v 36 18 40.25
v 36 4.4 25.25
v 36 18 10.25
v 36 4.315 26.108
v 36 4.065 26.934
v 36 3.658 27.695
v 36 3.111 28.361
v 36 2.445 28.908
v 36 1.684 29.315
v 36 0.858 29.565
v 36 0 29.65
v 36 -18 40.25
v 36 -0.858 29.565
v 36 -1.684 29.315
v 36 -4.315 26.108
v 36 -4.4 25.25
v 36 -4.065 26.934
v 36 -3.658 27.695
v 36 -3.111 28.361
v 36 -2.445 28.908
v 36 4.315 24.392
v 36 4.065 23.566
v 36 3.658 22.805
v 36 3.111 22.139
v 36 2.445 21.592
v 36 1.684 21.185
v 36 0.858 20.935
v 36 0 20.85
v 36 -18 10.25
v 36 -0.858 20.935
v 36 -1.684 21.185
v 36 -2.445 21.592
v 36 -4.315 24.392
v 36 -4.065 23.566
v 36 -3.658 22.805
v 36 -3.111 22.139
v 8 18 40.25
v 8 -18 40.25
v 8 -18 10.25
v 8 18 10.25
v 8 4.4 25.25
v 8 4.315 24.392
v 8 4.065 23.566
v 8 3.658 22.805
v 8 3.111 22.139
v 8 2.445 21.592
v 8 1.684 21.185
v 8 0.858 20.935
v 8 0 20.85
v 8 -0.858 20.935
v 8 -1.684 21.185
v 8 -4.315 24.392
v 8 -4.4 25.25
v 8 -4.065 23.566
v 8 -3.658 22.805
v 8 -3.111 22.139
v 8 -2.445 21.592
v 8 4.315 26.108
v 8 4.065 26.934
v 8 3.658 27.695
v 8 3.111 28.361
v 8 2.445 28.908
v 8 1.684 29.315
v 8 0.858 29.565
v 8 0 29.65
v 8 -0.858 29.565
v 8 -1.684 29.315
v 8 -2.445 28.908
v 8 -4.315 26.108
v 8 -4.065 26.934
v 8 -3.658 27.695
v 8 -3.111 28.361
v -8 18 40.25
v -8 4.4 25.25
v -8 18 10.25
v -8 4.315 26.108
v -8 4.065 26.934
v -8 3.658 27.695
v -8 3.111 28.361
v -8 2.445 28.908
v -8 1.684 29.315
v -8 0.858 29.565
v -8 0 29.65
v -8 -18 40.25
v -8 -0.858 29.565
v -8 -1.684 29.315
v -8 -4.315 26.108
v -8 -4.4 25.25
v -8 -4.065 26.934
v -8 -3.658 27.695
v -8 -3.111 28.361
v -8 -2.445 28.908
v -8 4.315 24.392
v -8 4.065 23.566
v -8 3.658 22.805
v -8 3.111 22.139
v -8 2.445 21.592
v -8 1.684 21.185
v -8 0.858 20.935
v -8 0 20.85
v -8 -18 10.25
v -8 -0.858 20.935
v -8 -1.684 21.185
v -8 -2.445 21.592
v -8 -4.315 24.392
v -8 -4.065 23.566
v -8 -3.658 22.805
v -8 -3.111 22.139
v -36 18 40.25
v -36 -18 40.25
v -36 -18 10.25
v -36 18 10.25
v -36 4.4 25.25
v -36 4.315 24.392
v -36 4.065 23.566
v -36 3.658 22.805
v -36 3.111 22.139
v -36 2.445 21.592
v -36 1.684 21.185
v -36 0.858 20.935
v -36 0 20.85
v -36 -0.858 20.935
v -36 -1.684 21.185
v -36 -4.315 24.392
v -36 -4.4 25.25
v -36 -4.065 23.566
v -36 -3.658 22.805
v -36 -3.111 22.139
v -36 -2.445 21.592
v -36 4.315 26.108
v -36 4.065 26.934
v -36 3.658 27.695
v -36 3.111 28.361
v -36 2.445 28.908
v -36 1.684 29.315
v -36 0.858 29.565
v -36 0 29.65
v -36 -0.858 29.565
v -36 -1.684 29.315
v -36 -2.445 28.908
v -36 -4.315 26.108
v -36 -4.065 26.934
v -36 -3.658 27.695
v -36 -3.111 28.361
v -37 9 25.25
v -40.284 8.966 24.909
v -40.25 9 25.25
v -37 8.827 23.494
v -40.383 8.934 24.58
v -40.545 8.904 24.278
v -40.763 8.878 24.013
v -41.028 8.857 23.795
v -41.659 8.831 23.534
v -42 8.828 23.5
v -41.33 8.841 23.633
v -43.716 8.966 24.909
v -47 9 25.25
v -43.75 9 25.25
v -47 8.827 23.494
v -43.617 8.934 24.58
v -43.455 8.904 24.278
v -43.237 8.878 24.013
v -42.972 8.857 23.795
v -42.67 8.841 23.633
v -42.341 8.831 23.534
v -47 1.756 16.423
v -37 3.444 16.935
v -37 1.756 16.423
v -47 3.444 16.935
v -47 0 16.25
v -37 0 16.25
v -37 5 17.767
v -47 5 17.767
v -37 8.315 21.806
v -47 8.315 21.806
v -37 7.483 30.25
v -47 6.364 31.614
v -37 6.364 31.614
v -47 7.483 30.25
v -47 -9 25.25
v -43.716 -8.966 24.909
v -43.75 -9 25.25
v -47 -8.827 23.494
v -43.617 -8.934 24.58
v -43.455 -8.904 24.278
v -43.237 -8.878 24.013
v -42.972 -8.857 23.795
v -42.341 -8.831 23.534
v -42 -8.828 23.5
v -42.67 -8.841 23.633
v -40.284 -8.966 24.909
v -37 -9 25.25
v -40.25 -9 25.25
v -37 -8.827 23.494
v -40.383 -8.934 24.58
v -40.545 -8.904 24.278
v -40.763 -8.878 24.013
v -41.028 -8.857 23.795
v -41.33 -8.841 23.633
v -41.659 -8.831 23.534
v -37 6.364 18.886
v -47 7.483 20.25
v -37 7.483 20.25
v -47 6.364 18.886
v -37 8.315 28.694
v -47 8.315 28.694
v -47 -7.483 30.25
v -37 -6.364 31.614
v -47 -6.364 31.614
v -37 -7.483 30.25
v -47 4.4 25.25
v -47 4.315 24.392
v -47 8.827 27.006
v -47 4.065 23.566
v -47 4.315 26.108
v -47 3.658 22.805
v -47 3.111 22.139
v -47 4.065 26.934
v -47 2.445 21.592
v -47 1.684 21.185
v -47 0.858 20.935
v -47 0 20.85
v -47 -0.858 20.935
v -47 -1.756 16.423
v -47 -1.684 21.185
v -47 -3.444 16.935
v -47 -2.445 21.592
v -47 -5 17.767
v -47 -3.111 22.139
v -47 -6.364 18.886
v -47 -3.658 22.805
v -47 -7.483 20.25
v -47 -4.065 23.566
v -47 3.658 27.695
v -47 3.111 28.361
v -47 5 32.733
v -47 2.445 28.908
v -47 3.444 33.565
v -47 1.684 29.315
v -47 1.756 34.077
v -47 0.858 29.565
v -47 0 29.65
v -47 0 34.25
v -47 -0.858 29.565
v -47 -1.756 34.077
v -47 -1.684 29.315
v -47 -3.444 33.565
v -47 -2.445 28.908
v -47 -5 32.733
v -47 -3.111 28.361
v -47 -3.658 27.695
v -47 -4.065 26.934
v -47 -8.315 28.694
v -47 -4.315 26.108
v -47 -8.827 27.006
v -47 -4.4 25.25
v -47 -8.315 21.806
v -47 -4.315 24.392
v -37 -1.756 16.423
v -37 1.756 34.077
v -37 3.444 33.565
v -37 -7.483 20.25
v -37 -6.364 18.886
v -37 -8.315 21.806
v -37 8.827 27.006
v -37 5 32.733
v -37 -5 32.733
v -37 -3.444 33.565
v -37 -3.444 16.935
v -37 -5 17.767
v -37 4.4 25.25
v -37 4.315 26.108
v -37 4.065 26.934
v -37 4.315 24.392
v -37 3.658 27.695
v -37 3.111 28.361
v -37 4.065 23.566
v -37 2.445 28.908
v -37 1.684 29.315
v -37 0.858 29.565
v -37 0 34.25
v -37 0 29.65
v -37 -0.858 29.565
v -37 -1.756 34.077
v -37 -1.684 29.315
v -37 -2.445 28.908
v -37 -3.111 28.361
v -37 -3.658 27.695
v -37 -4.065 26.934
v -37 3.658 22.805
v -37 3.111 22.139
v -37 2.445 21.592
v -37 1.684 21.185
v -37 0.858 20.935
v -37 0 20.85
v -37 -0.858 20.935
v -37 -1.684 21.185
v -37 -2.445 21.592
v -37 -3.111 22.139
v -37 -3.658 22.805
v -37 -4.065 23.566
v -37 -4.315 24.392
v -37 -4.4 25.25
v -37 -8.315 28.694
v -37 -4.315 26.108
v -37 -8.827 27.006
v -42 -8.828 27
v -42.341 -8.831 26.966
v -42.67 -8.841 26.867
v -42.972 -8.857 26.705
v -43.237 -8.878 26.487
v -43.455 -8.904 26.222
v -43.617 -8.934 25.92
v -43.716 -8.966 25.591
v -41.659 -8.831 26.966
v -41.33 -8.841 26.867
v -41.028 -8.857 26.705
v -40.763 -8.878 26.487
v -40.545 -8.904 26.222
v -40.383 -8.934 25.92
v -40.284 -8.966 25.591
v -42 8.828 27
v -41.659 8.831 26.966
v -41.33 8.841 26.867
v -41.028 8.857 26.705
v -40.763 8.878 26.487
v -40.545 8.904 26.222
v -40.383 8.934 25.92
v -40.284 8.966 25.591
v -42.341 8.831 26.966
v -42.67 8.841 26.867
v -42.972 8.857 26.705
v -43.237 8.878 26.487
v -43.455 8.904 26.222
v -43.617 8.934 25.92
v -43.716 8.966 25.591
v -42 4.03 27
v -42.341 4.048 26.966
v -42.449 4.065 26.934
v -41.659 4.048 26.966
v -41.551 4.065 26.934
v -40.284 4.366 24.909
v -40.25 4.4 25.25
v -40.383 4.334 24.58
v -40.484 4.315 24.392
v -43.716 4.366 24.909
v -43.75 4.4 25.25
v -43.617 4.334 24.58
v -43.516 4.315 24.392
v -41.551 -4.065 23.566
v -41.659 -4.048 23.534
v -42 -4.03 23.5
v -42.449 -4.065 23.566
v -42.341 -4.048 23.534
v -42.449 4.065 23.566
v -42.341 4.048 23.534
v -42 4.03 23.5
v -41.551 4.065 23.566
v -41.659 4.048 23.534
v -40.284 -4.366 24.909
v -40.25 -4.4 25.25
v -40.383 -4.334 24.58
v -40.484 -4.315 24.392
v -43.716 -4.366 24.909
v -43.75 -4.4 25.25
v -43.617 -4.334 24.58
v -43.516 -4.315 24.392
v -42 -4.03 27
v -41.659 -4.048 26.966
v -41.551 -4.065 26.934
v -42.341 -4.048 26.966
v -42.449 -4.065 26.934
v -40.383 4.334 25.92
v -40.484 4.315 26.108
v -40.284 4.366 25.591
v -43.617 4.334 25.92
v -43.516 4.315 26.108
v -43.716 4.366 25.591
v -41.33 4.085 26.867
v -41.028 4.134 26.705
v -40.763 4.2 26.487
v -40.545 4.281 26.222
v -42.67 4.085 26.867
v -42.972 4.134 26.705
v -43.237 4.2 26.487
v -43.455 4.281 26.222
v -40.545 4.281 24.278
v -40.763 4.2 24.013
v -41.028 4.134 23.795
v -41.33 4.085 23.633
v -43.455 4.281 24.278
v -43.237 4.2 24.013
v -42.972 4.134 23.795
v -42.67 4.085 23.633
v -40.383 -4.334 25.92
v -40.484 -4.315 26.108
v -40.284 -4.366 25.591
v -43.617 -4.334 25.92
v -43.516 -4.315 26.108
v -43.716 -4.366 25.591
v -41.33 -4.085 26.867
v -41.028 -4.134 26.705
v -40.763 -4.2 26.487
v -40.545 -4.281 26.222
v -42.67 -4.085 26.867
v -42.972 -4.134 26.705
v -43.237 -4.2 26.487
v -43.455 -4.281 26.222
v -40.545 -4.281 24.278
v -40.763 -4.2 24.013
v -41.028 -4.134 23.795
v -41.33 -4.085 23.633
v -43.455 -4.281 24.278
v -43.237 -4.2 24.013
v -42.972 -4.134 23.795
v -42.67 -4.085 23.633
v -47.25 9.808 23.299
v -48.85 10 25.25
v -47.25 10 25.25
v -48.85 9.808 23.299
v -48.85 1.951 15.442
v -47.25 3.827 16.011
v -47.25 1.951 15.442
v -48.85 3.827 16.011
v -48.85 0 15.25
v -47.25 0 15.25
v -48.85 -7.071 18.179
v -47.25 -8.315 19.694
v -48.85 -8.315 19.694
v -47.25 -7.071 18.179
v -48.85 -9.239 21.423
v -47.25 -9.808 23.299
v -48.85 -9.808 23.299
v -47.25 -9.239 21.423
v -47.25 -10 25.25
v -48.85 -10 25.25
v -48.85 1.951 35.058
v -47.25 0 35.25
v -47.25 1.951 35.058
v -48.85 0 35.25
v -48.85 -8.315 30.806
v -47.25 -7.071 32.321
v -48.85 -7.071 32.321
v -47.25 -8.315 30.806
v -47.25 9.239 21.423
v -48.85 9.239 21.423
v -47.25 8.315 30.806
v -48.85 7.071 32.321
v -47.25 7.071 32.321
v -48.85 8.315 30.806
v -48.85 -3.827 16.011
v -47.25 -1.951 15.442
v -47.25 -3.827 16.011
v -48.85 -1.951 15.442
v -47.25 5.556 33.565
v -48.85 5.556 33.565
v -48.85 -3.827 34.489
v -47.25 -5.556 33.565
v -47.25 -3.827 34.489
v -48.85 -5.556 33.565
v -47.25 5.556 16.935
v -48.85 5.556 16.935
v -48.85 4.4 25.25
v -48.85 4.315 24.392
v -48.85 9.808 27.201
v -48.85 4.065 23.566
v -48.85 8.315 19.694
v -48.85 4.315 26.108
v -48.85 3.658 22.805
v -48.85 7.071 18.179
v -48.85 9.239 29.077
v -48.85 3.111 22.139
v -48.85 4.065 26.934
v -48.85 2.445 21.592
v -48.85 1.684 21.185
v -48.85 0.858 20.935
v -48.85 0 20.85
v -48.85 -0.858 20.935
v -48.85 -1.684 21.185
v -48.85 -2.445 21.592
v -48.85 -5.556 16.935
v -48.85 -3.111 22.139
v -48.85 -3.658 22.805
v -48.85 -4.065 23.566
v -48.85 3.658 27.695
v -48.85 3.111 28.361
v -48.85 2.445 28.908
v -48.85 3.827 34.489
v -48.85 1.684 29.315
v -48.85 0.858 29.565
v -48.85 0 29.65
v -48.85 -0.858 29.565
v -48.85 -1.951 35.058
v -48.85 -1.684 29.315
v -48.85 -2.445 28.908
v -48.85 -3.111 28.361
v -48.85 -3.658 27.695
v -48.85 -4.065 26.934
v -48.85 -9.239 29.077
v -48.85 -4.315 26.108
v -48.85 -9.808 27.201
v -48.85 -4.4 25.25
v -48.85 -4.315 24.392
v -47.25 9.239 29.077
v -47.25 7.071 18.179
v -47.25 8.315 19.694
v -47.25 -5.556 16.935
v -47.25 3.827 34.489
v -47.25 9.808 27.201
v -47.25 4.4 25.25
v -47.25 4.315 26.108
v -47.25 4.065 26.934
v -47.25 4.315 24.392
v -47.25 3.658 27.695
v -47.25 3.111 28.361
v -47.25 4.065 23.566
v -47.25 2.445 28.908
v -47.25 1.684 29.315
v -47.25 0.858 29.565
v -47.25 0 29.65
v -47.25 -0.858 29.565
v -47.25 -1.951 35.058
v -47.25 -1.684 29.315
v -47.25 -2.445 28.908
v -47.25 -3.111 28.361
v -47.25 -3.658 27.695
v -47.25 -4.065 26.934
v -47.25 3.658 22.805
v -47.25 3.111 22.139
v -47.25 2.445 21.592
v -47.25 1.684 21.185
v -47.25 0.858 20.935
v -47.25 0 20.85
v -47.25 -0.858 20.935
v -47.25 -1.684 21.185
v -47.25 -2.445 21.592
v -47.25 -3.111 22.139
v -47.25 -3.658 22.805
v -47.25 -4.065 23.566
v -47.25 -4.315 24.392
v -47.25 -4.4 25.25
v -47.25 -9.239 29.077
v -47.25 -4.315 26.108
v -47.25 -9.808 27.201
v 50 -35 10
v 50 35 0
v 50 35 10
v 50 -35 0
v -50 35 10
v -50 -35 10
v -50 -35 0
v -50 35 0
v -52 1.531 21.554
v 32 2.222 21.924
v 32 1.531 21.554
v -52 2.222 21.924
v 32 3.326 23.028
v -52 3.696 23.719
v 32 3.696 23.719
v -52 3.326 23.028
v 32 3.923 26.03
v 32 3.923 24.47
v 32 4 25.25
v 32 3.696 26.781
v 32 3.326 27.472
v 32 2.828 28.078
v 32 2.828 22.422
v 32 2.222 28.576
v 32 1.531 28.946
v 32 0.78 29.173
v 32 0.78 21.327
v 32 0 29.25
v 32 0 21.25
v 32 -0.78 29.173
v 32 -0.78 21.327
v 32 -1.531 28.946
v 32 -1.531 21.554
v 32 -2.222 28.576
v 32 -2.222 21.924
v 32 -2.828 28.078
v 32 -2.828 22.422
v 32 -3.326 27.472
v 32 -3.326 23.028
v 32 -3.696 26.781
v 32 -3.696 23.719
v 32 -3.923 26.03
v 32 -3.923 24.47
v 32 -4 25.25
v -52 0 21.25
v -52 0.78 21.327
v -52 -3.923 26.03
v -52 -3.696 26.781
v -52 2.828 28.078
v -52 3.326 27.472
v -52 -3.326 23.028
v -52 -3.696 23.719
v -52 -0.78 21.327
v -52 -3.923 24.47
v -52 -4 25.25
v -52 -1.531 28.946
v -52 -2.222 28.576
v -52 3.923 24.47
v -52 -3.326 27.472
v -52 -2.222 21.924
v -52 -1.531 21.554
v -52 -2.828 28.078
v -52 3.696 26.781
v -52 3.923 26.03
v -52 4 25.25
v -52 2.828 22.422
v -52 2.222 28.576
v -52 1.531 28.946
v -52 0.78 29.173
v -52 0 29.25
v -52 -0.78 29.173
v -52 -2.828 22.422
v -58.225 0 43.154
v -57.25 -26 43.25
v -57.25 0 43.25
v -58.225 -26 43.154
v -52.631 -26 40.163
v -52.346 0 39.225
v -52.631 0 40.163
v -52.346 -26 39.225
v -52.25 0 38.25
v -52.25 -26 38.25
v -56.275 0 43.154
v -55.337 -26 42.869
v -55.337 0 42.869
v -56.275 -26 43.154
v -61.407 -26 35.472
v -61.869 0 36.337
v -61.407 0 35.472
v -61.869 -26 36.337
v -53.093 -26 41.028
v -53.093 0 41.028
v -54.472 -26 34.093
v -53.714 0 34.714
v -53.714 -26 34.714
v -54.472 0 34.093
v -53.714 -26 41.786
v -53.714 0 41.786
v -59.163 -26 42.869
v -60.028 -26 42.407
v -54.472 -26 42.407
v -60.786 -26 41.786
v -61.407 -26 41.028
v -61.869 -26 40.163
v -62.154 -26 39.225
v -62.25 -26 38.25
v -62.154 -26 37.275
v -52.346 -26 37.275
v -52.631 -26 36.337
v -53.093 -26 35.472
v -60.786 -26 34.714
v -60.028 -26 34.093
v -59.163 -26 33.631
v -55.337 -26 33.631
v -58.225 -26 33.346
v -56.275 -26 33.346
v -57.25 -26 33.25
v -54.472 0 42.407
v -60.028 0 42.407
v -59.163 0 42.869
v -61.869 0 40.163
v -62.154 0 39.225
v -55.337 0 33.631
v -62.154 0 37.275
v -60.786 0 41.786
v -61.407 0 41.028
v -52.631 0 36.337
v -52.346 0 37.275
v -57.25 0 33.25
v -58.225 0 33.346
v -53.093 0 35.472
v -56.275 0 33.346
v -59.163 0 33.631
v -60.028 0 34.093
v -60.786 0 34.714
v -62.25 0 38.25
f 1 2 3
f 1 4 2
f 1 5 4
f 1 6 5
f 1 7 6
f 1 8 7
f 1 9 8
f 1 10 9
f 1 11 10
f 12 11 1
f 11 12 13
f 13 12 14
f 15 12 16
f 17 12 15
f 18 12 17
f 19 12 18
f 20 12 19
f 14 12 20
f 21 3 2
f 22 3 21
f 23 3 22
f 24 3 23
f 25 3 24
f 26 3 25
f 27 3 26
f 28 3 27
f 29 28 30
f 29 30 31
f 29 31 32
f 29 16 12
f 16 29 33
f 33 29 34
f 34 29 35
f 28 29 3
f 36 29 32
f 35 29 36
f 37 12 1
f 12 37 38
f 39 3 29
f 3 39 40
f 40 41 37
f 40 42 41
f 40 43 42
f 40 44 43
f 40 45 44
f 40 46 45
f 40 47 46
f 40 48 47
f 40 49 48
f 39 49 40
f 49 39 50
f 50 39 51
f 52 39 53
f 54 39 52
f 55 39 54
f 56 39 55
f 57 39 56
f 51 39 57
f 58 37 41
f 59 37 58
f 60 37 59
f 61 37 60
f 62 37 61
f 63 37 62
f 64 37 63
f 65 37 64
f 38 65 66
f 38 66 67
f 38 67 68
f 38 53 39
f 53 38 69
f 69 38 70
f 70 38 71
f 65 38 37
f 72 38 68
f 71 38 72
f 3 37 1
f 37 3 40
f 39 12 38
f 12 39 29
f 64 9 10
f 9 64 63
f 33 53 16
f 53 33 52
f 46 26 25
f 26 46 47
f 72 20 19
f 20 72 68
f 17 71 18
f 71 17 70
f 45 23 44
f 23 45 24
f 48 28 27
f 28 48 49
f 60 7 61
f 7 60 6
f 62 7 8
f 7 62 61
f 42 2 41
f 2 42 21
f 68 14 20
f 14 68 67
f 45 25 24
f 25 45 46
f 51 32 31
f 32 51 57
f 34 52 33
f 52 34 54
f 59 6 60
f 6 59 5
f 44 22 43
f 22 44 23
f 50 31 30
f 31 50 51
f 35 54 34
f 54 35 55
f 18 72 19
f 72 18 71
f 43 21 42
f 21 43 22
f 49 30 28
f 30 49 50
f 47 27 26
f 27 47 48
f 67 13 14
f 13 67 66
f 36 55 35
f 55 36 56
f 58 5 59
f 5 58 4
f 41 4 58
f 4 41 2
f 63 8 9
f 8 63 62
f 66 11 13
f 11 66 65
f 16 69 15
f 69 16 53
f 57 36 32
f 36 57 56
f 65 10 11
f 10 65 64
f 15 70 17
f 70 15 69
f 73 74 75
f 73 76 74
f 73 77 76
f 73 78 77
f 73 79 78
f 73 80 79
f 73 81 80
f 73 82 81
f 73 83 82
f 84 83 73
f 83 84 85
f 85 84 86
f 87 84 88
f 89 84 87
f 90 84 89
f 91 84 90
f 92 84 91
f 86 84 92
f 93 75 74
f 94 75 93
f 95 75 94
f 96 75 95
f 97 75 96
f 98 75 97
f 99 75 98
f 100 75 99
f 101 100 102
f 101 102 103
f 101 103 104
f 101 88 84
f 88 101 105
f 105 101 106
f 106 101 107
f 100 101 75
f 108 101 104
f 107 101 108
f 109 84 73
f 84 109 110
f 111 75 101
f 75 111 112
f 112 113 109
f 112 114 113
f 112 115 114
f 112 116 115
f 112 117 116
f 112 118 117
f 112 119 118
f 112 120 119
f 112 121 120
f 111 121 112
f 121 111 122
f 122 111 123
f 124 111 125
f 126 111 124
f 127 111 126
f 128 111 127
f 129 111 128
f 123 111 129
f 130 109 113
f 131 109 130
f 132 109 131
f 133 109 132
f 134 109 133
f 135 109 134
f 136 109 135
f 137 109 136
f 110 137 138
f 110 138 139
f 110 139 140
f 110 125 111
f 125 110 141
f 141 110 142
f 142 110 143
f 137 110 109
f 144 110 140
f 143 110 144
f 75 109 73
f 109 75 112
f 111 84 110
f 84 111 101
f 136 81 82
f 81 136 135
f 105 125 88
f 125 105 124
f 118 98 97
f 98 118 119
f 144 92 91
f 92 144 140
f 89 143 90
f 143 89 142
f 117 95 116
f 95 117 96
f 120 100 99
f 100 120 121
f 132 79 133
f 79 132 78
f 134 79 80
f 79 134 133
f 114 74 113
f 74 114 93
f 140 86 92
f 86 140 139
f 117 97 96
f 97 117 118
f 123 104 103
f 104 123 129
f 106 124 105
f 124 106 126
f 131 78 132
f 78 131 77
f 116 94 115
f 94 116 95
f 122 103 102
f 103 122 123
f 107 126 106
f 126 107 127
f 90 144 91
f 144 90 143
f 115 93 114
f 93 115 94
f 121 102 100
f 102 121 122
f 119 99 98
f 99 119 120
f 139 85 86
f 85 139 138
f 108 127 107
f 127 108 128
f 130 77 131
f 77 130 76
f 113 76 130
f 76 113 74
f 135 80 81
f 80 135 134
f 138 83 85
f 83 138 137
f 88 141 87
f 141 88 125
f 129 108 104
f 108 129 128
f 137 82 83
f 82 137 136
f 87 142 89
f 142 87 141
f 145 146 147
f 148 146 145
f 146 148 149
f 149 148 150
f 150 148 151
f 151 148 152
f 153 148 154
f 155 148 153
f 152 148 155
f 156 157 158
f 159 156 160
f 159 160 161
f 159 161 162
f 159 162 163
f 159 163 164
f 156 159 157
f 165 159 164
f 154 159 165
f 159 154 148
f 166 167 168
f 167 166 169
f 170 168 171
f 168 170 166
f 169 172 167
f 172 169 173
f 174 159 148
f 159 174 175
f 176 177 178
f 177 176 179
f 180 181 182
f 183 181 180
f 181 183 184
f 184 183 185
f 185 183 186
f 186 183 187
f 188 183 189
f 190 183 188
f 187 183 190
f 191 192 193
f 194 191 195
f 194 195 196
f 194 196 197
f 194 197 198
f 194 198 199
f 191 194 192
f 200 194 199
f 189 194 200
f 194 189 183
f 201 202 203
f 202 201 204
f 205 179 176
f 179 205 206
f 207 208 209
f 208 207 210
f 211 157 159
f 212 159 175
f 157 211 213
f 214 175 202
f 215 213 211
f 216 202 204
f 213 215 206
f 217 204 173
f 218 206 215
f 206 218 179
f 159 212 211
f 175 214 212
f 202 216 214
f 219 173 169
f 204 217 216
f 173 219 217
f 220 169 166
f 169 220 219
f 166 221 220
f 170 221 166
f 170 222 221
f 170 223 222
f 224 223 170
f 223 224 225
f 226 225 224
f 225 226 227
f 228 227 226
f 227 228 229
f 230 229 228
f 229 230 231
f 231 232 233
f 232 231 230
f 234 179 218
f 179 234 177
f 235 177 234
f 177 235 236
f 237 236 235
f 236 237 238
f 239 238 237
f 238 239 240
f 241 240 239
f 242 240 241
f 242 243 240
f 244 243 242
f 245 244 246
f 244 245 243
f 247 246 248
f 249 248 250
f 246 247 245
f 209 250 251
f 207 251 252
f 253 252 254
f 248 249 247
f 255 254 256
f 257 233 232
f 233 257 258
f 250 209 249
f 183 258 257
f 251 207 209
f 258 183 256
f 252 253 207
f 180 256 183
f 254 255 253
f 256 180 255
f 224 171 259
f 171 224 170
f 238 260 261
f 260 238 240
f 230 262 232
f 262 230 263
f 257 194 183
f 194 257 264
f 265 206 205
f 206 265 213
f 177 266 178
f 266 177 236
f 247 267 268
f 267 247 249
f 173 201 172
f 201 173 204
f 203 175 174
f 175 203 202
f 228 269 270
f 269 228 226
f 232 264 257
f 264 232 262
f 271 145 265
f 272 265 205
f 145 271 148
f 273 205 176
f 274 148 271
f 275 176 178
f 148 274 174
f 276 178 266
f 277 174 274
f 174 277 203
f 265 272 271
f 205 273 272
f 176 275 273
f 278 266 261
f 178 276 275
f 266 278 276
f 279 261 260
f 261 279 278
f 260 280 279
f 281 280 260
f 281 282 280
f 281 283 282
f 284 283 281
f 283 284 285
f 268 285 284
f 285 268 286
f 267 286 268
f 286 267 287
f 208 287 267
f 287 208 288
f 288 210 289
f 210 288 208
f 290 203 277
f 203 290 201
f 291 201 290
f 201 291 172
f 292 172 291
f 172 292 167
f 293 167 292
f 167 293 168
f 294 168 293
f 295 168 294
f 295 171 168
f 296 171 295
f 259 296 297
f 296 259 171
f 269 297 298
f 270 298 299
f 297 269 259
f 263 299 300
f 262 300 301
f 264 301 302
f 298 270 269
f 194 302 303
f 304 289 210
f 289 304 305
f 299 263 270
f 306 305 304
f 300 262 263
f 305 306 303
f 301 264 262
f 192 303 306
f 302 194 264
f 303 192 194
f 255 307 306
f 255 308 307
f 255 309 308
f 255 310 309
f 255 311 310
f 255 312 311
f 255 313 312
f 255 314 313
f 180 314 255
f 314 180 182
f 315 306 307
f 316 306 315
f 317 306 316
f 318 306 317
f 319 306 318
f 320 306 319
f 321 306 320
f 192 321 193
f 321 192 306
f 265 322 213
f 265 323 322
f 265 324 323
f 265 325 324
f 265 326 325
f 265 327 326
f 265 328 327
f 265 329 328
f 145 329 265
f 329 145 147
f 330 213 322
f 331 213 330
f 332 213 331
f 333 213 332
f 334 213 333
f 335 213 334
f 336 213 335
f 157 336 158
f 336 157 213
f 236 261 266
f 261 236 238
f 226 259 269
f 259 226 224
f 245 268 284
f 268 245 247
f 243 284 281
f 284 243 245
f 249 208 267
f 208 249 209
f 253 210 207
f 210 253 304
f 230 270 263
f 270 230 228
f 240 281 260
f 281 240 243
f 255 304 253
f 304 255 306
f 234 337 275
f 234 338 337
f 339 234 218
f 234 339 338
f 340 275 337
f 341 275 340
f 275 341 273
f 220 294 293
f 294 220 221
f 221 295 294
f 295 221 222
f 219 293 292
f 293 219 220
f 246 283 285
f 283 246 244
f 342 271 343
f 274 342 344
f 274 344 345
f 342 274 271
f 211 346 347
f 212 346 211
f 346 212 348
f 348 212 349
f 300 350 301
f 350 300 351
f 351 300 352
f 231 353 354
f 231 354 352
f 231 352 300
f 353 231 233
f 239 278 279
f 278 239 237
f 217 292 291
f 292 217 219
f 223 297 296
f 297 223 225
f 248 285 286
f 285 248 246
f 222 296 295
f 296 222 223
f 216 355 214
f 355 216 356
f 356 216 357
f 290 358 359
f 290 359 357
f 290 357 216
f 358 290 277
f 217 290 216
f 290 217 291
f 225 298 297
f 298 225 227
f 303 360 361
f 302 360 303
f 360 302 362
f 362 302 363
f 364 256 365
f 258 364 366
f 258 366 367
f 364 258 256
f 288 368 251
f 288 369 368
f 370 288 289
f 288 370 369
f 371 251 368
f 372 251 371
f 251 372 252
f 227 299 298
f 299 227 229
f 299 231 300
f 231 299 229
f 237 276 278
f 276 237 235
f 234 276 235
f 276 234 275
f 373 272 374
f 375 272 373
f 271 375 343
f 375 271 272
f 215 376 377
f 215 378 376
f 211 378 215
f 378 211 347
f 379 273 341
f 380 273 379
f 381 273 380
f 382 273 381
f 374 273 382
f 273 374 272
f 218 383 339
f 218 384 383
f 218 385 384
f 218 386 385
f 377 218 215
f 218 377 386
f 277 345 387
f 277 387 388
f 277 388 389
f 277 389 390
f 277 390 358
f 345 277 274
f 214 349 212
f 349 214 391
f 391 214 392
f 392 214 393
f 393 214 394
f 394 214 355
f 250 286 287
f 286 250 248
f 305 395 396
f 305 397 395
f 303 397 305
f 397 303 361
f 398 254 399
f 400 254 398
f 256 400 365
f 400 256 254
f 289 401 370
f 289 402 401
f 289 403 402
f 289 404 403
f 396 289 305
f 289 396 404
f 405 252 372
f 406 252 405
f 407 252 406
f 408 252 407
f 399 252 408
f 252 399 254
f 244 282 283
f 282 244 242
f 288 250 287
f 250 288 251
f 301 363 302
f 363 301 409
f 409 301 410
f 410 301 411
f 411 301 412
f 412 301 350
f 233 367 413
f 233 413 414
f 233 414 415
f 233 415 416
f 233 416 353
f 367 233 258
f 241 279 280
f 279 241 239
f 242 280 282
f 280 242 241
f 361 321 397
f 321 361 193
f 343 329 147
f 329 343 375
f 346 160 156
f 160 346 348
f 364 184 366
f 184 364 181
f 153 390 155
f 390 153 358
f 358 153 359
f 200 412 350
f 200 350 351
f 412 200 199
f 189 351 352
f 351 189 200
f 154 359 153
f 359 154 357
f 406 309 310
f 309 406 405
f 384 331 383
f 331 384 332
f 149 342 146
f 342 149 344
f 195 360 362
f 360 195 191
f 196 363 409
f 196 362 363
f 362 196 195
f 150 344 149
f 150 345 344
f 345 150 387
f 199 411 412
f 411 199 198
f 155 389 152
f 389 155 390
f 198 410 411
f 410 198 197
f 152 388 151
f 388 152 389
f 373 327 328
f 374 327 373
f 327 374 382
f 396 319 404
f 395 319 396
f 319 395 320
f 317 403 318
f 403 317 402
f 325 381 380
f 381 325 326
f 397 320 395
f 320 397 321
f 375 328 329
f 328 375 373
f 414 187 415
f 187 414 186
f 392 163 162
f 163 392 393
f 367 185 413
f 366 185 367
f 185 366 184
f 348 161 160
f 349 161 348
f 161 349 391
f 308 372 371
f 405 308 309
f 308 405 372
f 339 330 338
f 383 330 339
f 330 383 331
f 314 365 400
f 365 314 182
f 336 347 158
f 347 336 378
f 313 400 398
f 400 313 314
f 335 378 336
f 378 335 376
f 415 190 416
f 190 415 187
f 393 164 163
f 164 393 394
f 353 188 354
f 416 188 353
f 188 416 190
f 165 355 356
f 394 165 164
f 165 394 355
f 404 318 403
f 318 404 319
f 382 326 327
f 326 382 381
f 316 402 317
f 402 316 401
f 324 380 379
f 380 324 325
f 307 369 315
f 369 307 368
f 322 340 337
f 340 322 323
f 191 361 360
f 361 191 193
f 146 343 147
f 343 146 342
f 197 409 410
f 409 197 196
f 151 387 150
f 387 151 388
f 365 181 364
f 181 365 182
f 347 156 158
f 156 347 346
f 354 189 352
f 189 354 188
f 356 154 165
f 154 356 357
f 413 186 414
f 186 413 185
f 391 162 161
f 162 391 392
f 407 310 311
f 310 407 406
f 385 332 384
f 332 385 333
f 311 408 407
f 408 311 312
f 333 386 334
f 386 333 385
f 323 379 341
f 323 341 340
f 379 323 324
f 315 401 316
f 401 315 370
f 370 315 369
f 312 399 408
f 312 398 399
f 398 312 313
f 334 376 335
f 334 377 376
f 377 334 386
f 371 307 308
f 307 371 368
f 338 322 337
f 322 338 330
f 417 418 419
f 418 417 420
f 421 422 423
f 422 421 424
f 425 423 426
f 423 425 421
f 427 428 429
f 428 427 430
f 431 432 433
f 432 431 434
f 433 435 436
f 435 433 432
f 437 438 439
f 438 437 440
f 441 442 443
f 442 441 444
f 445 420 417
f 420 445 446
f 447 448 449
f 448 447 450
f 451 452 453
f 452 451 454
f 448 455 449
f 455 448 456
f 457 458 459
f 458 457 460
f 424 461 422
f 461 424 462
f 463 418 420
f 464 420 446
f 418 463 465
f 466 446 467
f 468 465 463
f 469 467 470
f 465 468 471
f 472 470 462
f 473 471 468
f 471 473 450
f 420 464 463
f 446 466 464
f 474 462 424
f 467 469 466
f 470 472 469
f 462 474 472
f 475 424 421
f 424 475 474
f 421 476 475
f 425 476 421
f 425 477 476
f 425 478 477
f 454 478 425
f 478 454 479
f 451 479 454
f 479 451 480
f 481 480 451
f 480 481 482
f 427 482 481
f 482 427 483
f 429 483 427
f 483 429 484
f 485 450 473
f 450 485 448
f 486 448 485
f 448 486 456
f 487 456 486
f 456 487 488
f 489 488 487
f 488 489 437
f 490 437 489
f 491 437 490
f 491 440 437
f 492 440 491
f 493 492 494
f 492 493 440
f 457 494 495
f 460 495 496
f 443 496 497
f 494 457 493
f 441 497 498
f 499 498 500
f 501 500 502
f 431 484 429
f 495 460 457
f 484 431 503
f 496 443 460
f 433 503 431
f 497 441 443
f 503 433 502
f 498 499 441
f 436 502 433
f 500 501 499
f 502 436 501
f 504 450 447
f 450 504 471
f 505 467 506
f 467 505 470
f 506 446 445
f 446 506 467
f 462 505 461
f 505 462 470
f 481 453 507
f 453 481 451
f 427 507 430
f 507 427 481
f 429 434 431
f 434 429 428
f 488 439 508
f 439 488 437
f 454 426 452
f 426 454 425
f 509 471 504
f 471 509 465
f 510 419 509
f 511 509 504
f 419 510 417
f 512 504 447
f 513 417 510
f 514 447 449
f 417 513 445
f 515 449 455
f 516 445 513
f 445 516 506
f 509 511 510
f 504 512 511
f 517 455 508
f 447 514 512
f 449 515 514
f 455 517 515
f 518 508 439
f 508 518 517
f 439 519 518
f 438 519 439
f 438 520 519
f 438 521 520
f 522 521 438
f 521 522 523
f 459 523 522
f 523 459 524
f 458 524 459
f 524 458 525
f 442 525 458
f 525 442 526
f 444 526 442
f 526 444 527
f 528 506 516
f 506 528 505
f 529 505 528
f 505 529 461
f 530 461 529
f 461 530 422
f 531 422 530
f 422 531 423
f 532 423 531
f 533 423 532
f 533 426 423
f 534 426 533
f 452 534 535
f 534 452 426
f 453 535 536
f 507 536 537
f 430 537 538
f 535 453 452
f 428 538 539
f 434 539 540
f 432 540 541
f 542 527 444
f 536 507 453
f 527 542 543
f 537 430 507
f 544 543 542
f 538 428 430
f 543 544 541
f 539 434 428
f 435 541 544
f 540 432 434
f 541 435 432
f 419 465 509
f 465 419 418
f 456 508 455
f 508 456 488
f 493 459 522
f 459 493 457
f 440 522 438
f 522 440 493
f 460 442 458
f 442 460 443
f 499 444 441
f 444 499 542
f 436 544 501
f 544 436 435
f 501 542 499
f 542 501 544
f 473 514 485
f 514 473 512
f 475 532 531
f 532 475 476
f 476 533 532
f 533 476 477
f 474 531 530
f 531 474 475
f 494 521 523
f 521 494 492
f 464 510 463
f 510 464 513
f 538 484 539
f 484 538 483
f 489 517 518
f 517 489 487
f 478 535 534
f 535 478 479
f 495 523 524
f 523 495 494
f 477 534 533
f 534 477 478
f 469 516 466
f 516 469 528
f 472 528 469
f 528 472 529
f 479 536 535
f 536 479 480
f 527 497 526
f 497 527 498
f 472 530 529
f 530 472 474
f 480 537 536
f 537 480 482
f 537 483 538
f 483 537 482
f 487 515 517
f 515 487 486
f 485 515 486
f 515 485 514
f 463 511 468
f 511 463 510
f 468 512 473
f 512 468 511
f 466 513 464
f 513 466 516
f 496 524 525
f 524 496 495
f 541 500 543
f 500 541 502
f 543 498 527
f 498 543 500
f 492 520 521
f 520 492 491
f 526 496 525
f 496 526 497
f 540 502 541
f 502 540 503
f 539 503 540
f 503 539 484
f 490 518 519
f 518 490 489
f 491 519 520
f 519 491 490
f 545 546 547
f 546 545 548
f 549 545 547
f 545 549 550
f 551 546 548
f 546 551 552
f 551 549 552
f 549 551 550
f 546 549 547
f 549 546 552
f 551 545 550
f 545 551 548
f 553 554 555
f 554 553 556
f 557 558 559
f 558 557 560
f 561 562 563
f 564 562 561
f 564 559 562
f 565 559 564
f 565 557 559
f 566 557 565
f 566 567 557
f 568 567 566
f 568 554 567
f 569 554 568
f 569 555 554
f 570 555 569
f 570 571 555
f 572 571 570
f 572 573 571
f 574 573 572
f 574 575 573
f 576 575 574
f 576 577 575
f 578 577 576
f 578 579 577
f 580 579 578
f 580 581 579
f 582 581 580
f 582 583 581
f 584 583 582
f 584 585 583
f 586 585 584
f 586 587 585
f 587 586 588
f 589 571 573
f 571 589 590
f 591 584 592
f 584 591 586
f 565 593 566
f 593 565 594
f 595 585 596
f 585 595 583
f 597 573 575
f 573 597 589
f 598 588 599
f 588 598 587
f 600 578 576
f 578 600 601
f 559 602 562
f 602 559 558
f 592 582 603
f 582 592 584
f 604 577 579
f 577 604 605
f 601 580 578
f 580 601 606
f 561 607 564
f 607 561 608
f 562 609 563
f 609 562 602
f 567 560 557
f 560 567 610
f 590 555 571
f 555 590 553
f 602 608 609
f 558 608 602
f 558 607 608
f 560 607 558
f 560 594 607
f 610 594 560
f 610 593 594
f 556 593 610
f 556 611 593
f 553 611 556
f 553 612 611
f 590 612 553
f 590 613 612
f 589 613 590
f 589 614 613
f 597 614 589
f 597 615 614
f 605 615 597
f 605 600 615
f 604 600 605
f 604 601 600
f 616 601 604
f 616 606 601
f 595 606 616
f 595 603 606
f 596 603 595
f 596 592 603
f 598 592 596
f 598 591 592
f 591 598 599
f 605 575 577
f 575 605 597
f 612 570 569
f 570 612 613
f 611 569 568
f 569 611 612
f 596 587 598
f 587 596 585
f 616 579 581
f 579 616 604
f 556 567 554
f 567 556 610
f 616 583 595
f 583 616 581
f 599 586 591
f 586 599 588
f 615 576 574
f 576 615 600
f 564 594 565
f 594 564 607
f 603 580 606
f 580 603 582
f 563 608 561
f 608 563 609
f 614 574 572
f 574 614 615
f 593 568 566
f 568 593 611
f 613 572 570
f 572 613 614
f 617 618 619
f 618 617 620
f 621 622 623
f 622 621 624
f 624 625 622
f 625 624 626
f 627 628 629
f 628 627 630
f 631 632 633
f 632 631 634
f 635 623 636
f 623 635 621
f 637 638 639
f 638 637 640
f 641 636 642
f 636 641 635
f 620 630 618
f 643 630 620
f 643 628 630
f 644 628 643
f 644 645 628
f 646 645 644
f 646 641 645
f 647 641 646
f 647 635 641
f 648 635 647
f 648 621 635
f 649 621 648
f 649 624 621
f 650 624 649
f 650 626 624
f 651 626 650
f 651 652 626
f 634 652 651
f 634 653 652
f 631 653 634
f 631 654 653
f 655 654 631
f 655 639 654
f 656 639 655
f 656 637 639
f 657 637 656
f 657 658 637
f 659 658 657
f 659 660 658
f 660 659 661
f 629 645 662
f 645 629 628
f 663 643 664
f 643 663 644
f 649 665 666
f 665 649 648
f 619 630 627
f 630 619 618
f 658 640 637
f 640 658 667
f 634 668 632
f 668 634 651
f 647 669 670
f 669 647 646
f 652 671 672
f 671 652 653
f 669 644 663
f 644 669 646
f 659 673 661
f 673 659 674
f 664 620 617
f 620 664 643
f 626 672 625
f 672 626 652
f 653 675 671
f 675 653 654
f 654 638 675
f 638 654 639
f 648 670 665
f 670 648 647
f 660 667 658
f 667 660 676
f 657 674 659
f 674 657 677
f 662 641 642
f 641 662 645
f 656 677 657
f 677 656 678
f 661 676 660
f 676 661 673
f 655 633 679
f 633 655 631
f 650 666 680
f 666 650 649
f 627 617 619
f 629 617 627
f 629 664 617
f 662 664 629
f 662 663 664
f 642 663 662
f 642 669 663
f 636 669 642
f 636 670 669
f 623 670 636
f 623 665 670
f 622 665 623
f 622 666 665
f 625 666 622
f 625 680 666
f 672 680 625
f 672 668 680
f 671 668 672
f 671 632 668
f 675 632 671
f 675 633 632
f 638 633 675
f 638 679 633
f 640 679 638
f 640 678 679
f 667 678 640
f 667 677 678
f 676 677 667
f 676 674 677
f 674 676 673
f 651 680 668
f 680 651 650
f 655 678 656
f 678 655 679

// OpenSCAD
$fn = 32;

// ------------------------------------------------------------------------
// Machine vise: screw d8, jaws 28 x 30 mm
// Every part is its own module, assembly() places every instance.
// ------------------------------------------------------------------------

// --- part 1 ---
module vise_bed() {
  difference() {
    translate([-50, -35, 0]) cube([100, 70, 10]);
  }
}

// --- part 2 ---
module vise_jaw() {
  difference() {
    translate([-14, -18, 0]) cube([28, 36, 30]);
    translate([0, 0, 15]) rotate([0, 90, 0]) cylinder(h = 30, d = 8.8, center = true);
  }
}

// --- part 3 ---
module vise_screw() {
  translate([0, 0, -42]) cylinder(h = 84, d = 8);
}

// --- part 4 ---
module screw_collar() {
  difference() {
    cylinder(h = 10, d = 18);
    translate([0, 0, -1]) cylinder(h = 12, d = 8.8);
    translate([0, 0, 5]) rotate([90, 0, 0]) cylinder(h = 20, d = 3.5, center = true);
  }
}

// --- part 5 ---
module screw_washer() {
  difference() {
      translate([0, 0, 0]) cylinder(h = 1.6, d = 20);
      translate([0, 0, -1]) cylinder(h = 3.6, d = 8.8);
    }
}

// --- part 6 ---
module vise_handle() {
  cylinder(h = 26, d = 10);
}

// --- assembly ---
module assembly() {
  color([0.80, 0.24, 0.20]) translate([0, 0, 0]) rotate([0, 0, 0]) vise_bed();
  color([0.20, 0.45, 0.75]) translate([22, 0, 10.25]) rotate([0, 0, 0]) vise_jaw();
  color([0.25, 0.62, 0.32]) translate([-22, 0, 10.25]) rotate([0, 0, 0]) vise_jaw();
  color([0.92, 0.70, 0.18]) translate([-10, 0, 25.25]) rotate([0, 90, 0]) vise_screw();
  color([0.58, 0.35, 0.70]) translate([-47, 0, 25.25]) rotate([0, 90, 0]) screw_collar();
  color([0.16, 0.66, 0.66]) translate([-48.85, 0, 25.25]) rotate([0, 90, 0]) screw_washer();
  color([0.85, 0.48, 0.18]) translate([-57.25, 0, 38.25]) rotate([90, 0, 0]) vise_handle();
}

assembly();
